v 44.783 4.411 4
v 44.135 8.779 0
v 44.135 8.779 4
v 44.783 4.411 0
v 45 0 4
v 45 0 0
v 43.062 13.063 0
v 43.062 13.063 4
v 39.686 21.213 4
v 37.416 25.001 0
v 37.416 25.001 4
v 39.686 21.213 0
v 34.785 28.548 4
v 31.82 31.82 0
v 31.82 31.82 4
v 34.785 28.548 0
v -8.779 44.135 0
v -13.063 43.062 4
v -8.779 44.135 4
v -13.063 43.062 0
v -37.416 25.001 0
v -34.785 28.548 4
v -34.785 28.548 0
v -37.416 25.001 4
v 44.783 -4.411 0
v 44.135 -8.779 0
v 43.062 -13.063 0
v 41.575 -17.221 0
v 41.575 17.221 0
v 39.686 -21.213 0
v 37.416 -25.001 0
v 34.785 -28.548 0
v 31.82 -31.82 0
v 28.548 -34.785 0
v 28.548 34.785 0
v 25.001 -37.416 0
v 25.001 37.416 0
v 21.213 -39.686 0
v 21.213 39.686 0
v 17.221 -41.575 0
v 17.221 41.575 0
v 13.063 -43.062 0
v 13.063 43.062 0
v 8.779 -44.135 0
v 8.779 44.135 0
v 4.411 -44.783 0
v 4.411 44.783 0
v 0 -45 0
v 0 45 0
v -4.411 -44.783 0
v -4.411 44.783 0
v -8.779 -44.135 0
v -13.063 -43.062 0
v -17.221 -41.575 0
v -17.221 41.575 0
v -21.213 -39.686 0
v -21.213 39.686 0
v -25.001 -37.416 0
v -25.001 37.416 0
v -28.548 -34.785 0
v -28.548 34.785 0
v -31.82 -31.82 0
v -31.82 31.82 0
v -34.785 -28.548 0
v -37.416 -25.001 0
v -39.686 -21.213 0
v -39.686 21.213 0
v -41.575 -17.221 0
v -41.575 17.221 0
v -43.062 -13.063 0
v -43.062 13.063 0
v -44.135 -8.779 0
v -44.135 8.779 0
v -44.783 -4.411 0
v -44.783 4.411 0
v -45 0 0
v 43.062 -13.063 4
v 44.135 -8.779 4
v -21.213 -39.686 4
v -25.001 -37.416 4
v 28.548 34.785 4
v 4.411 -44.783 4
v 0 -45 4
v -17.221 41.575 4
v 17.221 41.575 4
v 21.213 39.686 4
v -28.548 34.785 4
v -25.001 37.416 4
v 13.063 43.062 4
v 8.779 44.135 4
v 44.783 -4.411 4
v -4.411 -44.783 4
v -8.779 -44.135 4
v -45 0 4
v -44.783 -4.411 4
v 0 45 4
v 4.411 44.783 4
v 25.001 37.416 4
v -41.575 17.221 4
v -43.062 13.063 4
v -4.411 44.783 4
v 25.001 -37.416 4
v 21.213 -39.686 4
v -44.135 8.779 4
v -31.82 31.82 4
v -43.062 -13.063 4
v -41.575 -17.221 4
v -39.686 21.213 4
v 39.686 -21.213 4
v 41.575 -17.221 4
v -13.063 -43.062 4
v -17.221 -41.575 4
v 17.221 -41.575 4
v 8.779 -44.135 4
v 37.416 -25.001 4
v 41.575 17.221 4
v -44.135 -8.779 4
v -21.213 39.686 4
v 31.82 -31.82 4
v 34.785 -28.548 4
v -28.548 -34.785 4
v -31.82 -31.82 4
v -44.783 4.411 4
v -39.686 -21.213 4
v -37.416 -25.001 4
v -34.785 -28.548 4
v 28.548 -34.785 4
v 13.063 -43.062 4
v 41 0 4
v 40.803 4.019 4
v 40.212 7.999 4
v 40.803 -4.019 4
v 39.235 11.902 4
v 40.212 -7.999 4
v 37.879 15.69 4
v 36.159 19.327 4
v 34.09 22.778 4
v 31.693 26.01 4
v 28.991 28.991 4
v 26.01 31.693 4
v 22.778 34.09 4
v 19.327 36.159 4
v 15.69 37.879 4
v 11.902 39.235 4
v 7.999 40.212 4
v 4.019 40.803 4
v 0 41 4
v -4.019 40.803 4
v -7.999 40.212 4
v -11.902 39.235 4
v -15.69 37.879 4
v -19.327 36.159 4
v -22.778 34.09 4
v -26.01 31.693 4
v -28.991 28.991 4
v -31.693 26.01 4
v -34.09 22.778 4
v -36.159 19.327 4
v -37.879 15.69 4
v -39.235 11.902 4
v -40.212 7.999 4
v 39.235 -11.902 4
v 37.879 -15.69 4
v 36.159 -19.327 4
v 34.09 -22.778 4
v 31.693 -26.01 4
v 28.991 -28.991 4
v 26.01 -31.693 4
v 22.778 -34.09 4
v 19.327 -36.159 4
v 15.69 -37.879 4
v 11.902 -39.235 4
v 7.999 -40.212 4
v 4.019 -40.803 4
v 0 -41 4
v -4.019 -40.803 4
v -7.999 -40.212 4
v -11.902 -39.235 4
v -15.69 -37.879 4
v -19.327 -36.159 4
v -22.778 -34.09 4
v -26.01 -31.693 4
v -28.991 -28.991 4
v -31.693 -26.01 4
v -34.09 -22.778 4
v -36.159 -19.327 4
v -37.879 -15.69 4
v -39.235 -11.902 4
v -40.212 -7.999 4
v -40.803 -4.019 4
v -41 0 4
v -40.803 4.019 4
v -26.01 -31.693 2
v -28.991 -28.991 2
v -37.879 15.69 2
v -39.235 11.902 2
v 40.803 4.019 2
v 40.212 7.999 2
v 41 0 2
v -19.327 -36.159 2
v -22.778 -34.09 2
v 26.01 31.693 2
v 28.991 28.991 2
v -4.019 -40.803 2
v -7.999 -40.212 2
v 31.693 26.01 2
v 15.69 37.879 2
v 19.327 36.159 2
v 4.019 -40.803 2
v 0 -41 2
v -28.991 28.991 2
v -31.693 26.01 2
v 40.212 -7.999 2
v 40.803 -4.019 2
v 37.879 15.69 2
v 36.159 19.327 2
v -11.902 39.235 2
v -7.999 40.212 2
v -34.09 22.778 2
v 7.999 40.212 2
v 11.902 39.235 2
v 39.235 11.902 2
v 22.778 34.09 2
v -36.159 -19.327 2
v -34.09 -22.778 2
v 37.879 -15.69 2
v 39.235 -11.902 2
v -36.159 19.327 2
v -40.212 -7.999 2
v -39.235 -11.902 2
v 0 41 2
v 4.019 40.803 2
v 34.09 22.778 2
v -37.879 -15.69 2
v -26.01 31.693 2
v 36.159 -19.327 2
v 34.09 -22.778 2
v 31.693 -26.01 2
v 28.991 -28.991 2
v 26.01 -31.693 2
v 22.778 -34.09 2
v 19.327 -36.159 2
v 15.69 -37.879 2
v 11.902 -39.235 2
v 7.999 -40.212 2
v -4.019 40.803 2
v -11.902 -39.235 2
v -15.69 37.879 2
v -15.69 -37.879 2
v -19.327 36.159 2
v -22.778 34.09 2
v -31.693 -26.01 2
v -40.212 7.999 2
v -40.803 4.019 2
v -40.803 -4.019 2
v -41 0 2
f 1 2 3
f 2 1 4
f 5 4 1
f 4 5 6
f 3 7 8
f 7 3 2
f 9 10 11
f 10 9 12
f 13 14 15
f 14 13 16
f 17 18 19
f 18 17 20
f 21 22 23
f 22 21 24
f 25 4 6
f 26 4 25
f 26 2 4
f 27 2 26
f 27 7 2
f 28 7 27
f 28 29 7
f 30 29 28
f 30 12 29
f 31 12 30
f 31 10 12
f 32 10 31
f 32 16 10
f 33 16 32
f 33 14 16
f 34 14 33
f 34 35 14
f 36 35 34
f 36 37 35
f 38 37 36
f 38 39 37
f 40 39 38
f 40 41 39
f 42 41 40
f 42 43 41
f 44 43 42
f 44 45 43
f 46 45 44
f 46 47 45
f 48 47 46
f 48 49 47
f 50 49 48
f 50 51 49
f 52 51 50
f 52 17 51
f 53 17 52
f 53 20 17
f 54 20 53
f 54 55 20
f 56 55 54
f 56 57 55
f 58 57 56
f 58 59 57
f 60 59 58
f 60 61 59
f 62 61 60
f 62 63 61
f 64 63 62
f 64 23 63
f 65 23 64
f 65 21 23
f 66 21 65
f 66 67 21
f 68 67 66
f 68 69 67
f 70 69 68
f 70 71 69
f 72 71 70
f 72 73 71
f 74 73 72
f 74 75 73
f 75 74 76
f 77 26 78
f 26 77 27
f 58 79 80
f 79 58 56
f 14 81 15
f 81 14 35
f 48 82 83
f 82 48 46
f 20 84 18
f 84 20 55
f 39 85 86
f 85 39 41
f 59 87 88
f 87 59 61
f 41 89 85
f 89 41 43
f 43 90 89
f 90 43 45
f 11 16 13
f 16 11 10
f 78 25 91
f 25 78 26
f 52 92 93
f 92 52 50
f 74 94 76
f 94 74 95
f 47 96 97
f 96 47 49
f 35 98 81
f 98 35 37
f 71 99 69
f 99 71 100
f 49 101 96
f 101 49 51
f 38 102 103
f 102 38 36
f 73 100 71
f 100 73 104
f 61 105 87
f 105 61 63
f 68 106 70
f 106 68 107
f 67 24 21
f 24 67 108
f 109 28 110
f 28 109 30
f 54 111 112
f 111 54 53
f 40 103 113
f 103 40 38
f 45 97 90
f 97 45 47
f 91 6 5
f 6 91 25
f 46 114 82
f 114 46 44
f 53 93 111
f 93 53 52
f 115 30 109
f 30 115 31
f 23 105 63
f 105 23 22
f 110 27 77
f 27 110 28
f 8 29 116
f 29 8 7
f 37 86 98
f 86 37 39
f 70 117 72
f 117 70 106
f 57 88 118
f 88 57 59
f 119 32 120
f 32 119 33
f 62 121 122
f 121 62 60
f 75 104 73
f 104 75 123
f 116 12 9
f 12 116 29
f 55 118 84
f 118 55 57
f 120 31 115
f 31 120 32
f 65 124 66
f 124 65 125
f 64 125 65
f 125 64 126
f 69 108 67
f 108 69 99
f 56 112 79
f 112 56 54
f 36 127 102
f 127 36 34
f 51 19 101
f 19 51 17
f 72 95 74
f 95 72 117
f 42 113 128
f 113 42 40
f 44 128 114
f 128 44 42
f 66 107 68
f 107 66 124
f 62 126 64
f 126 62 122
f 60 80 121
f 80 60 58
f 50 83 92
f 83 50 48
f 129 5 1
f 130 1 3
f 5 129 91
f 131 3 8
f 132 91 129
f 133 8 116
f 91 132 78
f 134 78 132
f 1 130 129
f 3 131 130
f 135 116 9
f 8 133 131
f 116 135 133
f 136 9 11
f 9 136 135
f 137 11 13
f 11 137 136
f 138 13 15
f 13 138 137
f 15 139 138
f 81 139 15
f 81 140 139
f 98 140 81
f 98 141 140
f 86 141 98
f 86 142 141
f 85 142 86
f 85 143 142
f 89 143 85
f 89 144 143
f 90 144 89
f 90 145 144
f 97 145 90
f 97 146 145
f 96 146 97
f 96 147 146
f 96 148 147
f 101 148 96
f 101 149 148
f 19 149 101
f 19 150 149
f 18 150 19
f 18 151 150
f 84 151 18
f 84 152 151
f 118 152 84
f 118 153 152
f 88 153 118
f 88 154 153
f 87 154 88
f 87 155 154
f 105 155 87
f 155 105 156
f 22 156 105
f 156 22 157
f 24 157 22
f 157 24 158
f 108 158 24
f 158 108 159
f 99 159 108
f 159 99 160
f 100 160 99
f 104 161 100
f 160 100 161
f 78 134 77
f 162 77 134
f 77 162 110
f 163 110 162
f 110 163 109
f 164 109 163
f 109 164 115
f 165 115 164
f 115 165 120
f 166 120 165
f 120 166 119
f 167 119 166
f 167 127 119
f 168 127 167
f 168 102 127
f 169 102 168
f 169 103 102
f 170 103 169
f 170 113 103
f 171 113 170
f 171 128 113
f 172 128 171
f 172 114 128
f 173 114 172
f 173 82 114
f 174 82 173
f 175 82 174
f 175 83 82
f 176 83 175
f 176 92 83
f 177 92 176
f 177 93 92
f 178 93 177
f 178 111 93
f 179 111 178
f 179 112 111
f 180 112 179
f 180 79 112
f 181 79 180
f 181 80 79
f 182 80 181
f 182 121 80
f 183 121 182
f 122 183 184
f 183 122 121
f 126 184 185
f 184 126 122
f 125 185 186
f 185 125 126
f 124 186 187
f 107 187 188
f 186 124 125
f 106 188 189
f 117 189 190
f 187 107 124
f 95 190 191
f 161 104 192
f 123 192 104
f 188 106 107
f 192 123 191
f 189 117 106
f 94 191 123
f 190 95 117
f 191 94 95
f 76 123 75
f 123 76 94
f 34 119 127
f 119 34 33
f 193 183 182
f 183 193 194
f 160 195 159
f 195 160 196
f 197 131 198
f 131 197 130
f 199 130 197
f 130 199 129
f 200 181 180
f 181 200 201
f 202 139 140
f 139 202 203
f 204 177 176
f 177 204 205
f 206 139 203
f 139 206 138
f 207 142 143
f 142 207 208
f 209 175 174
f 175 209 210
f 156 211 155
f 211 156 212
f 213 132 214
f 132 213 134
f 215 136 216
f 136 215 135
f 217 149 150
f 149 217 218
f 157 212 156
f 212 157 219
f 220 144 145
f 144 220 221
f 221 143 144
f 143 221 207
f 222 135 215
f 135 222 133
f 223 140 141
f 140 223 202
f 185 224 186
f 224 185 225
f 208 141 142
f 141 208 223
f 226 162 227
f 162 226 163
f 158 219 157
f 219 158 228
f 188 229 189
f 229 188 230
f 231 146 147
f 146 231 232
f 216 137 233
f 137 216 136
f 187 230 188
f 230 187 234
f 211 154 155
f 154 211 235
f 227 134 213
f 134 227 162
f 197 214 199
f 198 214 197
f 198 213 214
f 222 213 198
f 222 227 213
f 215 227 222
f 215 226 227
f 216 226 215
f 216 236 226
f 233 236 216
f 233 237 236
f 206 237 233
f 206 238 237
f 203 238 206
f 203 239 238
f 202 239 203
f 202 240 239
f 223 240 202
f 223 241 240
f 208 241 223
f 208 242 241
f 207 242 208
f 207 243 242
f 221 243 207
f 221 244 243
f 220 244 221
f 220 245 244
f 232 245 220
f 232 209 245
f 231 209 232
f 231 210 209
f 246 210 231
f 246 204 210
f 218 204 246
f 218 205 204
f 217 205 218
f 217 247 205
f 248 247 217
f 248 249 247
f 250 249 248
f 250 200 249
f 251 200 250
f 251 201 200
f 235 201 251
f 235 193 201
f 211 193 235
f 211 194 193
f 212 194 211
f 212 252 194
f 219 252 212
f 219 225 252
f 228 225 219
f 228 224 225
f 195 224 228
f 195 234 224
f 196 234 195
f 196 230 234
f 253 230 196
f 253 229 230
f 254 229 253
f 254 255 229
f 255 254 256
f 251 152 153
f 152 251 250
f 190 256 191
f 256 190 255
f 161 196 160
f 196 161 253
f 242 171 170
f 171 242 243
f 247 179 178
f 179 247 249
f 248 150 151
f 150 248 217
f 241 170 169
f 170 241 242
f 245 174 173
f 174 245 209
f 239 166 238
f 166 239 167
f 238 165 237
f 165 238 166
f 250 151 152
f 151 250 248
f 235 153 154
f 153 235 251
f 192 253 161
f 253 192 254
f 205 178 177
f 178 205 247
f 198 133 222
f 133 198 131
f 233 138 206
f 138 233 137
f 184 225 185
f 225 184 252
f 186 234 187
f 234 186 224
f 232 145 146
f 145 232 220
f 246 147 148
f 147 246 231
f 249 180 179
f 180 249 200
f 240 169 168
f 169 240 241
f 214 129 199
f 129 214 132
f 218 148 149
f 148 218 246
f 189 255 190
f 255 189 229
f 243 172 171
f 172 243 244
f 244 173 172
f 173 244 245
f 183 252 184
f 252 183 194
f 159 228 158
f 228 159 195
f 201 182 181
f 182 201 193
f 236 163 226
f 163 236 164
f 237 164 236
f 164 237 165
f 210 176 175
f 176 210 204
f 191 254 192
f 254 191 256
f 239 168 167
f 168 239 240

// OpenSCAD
// Sample project for CI: a coaster with a stepped rim. Small and quick to render.
part = "assembly"; // [assembly, coaster, clash_none]

d = 90;       // outer diameter
h = 4;        // total height
floor_t = 2;  // floor under the recess
rim = 4;      // rim width
$fn = 64;

module coaster() {
    difference() {
        cylinder(d = d, h = h);
        translate([0, 0, floor_t]) cylinder(d = d - 2 * rim, h = h);
    }
}

if (part == "assembly" || part == "coaster") coaster();
if (part == "clash_none") intersection() { coaster(); translate([200, 0, 0]) cube(1); }
